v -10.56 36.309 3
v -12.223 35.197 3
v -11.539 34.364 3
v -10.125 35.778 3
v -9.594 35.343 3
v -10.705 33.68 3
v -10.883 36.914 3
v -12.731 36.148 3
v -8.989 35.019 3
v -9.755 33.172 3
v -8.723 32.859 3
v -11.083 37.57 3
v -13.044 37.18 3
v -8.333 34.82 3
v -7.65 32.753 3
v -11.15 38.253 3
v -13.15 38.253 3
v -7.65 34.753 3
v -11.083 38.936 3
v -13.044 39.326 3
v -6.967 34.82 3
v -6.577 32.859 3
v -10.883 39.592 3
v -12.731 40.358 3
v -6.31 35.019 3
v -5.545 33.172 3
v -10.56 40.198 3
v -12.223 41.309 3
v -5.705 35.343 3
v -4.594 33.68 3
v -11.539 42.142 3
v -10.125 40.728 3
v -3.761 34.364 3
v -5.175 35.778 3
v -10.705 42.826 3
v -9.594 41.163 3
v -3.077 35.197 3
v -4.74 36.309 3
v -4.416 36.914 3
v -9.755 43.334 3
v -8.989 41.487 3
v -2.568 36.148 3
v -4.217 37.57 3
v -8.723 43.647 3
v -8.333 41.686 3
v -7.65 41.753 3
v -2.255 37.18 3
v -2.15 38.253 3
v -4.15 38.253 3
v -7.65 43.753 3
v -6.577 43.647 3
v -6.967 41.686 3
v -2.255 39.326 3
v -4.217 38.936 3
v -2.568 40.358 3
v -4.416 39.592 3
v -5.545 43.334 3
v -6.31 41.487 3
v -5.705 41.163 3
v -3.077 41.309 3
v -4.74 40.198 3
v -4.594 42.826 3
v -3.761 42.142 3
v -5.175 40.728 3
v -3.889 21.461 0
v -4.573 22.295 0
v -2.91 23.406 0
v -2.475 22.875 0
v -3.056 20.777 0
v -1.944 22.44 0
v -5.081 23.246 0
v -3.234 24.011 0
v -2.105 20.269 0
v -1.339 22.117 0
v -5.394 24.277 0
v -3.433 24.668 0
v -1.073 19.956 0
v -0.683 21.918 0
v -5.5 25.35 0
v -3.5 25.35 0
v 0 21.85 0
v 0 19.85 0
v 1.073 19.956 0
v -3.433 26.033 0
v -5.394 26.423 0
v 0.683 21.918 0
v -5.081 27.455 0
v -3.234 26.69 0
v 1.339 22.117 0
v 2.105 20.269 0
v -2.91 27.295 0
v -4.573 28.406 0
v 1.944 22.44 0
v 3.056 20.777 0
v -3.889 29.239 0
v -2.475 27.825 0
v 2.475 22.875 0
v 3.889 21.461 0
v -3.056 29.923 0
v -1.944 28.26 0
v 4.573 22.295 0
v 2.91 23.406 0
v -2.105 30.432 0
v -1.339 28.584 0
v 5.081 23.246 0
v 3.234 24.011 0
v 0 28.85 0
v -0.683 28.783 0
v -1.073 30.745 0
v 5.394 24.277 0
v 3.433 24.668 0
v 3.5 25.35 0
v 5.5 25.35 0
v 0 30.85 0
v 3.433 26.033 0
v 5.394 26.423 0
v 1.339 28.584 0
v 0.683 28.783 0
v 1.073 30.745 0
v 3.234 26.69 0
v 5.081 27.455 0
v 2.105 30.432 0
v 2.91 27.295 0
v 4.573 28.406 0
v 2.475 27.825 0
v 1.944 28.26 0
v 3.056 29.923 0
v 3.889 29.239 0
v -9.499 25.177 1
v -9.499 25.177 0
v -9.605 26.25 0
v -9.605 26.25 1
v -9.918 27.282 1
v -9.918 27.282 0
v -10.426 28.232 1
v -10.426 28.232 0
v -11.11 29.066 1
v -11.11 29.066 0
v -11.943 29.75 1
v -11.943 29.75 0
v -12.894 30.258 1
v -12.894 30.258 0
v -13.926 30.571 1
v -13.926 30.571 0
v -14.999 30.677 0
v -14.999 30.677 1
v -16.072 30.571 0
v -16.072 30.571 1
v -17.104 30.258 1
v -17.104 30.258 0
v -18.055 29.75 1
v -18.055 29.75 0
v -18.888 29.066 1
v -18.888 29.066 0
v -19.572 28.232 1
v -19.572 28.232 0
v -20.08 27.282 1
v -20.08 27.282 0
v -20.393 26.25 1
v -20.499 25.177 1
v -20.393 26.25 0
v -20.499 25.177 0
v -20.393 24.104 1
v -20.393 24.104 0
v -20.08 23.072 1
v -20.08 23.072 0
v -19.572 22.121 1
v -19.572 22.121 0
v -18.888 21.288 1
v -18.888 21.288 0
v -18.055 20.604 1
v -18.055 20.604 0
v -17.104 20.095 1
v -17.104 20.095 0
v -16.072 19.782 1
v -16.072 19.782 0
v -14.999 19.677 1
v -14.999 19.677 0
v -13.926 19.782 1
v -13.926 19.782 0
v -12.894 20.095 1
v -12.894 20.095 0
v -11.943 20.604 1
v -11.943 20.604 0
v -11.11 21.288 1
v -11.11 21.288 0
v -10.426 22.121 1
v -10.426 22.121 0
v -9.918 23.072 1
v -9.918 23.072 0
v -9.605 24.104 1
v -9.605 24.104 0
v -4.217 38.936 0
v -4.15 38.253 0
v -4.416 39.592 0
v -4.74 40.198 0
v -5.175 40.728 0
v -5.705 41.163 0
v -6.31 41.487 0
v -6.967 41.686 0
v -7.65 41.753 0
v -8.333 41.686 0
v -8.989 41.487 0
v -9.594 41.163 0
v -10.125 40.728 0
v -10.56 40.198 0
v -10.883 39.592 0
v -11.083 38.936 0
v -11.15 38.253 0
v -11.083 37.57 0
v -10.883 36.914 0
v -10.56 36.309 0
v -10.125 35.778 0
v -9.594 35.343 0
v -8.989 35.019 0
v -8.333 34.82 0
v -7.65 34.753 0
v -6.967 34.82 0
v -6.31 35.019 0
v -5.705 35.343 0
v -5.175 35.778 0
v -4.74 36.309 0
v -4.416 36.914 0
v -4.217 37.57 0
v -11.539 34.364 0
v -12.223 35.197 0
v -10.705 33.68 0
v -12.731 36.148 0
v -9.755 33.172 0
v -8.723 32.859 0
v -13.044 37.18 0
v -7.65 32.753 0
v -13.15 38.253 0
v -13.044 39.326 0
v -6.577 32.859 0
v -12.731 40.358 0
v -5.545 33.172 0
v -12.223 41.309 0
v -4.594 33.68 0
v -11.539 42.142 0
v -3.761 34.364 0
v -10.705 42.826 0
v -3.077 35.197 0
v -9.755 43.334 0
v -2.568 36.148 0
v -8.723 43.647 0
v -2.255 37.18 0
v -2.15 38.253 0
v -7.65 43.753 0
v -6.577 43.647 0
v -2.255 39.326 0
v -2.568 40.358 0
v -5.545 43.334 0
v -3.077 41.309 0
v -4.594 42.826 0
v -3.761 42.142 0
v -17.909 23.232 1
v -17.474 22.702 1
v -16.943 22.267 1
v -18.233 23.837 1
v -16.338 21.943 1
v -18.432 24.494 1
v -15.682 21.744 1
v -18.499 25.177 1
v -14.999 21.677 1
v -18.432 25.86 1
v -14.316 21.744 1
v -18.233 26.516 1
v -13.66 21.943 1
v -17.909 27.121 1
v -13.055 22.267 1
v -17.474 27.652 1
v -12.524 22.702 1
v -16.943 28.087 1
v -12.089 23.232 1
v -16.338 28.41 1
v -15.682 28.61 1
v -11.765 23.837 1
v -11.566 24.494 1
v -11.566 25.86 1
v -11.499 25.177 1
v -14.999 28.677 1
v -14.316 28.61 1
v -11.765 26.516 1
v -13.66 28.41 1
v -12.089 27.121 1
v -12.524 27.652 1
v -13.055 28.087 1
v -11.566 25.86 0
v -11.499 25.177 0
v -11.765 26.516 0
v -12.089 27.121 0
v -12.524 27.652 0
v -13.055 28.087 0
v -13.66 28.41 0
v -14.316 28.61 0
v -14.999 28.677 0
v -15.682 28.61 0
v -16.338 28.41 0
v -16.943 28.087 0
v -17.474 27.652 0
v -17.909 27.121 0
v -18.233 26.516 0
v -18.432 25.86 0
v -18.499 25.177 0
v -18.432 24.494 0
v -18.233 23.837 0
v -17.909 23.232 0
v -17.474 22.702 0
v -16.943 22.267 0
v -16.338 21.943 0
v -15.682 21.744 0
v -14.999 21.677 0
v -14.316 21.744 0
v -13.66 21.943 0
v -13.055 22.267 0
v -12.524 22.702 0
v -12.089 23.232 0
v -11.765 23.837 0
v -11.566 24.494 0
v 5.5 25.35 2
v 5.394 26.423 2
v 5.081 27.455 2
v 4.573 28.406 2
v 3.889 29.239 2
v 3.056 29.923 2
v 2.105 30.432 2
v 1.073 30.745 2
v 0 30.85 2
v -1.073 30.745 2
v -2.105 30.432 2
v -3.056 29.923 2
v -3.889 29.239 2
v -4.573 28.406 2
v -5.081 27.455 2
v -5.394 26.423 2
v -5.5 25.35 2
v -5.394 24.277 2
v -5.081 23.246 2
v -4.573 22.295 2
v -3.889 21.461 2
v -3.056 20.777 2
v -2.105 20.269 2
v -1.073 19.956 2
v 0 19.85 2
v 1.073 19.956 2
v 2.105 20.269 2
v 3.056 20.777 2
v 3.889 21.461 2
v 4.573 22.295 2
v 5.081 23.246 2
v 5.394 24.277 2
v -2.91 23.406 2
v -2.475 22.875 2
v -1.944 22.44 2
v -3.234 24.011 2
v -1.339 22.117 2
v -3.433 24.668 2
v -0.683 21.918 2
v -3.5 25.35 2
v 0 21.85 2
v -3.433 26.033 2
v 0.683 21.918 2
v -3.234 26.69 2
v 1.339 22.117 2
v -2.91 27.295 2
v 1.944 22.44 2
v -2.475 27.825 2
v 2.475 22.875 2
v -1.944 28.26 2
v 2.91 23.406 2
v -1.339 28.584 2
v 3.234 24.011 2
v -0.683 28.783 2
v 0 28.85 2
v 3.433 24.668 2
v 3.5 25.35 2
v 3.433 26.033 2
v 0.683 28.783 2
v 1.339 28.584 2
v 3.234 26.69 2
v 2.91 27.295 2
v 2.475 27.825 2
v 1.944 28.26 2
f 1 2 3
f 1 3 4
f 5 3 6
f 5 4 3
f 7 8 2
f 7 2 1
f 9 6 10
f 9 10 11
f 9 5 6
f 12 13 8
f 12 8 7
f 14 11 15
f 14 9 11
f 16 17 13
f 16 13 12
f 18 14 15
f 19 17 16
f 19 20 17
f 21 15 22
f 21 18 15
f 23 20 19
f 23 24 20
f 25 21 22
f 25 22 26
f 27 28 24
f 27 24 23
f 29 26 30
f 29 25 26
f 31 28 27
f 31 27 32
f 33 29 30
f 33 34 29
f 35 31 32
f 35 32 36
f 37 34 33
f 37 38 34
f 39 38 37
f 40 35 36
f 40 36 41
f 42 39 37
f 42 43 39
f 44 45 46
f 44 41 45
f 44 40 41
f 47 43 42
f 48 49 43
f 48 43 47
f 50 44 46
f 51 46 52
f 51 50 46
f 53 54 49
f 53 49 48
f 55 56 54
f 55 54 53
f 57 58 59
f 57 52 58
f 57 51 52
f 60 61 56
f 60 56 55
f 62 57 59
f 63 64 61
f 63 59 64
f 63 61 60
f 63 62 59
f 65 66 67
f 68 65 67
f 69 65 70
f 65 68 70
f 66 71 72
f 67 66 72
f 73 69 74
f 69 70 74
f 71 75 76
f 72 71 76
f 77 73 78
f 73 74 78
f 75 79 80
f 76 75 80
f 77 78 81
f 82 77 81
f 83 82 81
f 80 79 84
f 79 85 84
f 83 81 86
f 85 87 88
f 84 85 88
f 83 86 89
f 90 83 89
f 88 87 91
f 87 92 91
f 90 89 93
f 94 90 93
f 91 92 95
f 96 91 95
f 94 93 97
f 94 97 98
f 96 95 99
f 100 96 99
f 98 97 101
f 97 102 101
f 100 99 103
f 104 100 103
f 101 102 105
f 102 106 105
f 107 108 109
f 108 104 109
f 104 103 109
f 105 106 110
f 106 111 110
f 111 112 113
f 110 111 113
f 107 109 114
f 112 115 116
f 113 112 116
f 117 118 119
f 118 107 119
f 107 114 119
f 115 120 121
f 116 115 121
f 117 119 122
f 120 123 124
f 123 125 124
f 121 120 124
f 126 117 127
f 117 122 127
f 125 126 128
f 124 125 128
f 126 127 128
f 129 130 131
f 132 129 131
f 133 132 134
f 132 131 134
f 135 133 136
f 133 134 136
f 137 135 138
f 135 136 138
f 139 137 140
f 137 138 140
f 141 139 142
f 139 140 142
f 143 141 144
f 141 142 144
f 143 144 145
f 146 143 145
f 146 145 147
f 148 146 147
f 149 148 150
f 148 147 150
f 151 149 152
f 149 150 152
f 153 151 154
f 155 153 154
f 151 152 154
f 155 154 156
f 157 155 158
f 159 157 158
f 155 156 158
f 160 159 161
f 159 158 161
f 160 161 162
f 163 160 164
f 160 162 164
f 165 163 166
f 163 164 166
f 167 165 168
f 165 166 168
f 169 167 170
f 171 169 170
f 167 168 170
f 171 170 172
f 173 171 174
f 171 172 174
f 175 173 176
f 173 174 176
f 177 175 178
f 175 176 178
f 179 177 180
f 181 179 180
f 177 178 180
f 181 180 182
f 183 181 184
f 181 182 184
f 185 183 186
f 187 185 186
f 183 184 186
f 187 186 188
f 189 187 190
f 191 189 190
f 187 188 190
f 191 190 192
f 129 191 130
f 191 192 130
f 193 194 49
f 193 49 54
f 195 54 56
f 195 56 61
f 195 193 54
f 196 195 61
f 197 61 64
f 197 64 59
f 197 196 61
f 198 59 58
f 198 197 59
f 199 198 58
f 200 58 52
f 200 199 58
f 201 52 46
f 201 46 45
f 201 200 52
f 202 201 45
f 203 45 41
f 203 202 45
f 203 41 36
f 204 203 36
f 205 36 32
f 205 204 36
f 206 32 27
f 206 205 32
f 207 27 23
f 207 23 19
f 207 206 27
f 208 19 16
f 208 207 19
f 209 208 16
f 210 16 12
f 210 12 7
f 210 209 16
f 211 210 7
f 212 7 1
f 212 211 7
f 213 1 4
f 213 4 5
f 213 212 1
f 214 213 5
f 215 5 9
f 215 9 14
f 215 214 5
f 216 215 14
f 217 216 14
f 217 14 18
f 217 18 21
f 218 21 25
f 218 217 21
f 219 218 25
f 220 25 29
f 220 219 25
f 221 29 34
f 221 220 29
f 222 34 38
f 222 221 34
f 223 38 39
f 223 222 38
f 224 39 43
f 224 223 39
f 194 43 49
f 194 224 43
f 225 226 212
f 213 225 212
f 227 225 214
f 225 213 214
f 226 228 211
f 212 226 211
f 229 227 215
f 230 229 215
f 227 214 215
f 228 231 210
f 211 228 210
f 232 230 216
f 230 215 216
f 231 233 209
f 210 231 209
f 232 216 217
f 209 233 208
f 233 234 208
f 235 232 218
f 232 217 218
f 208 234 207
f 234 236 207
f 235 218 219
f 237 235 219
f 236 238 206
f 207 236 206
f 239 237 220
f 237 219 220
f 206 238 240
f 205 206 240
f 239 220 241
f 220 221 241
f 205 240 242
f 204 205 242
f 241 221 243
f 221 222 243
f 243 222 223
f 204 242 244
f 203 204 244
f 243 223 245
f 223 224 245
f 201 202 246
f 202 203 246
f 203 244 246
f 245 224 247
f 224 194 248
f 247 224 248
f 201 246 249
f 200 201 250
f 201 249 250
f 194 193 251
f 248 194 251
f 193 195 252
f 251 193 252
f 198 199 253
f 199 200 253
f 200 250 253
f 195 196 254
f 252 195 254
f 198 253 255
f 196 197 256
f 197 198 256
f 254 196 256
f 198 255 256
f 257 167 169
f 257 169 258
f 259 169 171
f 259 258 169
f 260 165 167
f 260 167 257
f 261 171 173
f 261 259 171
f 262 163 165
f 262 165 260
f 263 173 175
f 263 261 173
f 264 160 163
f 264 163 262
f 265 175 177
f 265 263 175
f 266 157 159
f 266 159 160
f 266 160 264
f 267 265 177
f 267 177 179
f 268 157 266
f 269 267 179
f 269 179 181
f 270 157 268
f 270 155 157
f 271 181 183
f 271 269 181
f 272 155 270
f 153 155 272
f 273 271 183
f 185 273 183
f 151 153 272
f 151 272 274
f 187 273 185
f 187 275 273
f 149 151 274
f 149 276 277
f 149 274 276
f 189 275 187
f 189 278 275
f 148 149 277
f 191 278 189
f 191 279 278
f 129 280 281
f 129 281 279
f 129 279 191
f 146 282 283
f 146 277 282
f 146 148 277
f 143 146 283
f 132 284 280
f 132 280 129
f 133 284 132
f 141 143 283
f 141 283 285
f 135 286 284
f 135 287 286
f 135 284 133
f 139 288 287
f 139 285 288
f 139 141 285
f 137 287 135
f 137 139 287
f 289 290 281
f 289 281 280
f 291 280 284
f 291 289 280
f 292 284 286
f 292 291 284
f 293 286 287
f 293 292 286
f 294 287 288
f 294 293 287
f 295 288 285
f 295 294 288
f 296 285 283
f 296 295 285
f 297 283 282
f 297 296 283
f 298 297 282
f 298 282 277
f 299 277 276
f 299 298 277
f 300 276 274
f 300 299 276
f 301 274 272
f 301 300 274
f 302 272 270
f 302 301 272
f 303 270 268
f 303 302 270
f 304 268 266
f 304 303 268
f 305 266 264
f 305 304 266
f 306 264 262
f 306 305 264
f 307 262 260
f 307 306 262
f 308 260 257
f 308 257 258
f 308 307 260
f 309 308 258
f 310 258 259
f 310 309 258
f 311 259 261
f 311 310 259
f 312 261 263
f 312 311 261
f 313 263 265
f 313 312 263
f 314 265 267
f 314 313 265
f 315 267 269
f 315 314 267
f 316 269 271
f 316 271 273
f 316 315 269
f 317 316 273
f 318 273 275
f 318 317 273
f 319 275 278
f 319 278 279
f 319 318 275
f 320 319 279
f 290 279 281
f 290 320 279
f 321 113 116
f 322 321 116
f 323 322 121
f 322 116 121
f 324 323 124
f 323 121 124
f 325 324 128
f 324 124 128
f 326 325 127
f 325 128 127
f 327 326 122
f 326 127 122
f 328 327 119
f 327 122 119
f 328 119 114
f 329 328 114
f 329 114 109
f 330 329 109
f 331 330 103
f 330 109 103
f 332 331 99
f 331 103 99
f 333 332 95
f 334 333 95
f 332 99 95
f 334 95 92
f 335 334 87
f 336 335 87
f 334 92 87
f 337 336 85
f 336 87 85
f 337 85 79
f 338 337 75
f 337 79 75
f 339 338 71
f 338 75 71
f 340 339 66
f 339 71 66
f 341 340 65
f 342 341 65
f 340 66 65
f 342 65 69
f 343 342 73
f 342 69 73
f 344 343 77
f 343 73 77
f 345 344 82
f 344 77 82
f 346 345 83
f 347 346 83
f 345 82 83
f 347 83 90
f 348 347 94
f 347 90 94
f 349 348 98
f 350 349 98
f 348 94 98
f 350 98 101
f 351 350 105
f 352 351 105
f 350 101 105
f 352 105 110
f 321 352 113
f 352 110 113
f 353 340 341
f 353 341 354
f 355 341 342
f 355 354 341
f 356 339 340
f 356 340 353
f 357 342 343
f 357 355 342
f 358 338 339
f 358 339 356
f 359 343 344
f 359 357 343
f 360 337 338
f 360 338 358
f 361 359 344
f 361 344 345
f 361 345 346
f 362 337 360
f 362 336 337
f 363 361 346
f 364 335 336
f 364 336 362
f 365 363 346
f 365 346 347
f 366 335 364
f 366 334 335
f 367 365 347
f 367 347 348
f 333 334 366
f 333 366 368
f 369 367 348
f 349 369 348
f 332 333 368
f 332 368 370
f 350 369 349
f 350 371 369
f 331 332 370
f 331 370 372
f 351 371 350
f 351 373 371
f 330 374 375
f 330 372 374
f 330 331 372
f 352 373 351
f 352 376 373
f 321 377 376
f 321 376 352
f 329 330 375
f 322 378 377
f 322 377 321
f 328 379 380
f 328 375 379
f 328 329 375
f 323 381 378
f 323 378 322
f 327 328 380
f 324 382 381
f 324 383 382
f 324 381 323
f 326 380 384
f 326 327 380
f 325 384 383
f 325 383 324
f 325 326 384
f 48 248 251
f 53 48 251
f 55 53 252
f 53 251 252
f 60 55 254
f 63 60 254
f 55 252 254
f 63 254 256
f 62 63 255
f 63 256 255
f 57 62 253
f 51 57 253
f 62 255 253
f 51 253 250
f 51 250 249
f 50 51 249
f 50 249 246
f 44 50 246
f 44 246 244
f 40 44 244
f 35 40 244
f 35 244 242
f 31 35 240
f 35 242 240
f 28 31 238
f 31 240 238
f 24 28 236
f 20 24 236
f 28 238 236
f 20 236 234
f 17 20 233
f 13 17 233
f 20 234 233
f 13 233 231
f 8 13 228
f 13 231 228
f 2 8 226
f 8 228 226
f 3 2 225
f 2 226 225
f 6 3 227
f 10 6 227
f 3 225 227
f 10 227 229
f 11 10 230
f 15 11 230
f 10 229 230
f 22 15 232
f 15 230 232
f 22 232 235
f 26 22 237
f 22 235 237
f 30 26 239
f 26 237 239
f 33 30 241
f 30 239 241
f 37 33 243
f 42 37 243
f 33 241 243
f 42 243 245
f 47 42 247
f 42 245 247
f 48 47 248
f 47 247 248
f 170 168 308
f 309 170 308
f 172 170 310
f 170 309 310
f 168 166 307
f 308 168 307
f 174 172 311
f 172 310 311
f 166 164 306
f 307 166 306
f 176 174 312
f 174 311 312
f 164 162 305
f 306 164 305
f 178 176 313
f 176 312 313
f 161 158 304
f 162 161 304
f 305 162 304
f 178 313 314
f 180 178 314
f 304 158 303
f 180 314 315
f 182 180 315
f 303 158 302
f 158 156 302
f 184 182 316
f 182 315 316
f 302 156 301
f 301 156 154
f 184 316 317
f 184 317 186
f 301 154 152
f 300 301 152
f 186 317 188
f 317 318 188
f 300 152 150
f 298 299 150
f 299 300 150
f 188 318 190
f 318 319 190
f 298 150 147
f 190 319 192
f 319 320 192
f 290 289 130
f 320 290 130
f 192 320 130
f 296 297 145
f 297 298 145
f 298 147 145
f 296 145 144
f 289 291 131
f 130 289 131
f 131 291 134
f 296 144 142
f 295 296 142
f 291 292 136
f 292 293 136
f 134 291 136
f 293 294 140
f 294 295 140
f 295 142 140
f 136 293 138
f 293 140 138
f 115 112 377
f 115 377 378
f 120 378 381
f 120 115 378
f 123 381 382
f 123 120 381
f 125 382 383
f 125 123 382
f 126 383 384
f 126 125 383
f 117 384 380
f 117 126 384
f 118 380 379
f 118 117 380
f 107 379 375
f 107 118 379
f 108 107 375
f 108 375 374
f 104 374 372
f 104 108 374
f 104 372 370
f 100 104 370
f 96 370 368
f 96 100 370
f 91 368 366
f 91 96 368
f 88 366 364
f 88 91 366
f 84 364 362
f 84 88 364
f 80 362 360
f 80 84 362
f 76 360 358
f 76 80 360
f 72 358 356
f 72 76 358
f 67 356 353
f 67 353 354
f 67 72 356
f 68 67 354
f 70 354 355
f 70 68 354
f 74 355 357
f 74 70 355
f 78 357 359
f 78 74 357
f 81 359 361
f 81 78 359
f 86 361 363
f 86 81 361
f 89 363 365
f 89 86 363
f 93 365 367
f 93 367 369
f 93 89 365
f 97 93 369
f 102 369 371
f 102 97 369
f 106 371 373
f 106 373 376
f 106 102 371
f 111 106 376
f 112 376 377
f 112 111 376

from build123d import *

# Parameters (mm, degrees)
F0_R     = 5.5
F0_R_2   = 3.5
F1_DEPTH = 1
F2_DEPTH = 2
F3_DEPTH = 3


with BuildPart() as f1:
    # F0 (on Top) → F1 (new body)
    with BuildSketch(Plane.XY):
        with Locations((-14.998996, 25.176784)):
            Circle(F0_R)
        with Locations((-14.998996, 25.176784)):
            Circle(F0_R_2, mode=Mode.SUBTRACT)
    extrude(amount=F1_DEPTH)


with BuildPart() as f2:
    # F0 (on Top) → F2 (new body)
    with BuildSketch(Plane.XY):
        with Locations((0, 25.350336)):
            Circle(F0_R)
        with Locations((0, 25.350336)):
            Circle(F0_R_2, mode=Mode.SUBTRACT)
    extrude(amount=F2_DEPTH)


with BuildPart() as f3:
    # F0 (on Top) → F3 (new body)
    with BuildSketch(Plane.XY):
        with Locations((-7.649799, 38.253071)):
            Circle(F0_R)
        with Locations((-7.649799, 38.253071)):
            Circle(F0_R_2, mode=Mode.SUBTRACT)
    extrude(amount=F3_DEPTH)


solid = Compound([f1.part, f2.part, f3.part])
